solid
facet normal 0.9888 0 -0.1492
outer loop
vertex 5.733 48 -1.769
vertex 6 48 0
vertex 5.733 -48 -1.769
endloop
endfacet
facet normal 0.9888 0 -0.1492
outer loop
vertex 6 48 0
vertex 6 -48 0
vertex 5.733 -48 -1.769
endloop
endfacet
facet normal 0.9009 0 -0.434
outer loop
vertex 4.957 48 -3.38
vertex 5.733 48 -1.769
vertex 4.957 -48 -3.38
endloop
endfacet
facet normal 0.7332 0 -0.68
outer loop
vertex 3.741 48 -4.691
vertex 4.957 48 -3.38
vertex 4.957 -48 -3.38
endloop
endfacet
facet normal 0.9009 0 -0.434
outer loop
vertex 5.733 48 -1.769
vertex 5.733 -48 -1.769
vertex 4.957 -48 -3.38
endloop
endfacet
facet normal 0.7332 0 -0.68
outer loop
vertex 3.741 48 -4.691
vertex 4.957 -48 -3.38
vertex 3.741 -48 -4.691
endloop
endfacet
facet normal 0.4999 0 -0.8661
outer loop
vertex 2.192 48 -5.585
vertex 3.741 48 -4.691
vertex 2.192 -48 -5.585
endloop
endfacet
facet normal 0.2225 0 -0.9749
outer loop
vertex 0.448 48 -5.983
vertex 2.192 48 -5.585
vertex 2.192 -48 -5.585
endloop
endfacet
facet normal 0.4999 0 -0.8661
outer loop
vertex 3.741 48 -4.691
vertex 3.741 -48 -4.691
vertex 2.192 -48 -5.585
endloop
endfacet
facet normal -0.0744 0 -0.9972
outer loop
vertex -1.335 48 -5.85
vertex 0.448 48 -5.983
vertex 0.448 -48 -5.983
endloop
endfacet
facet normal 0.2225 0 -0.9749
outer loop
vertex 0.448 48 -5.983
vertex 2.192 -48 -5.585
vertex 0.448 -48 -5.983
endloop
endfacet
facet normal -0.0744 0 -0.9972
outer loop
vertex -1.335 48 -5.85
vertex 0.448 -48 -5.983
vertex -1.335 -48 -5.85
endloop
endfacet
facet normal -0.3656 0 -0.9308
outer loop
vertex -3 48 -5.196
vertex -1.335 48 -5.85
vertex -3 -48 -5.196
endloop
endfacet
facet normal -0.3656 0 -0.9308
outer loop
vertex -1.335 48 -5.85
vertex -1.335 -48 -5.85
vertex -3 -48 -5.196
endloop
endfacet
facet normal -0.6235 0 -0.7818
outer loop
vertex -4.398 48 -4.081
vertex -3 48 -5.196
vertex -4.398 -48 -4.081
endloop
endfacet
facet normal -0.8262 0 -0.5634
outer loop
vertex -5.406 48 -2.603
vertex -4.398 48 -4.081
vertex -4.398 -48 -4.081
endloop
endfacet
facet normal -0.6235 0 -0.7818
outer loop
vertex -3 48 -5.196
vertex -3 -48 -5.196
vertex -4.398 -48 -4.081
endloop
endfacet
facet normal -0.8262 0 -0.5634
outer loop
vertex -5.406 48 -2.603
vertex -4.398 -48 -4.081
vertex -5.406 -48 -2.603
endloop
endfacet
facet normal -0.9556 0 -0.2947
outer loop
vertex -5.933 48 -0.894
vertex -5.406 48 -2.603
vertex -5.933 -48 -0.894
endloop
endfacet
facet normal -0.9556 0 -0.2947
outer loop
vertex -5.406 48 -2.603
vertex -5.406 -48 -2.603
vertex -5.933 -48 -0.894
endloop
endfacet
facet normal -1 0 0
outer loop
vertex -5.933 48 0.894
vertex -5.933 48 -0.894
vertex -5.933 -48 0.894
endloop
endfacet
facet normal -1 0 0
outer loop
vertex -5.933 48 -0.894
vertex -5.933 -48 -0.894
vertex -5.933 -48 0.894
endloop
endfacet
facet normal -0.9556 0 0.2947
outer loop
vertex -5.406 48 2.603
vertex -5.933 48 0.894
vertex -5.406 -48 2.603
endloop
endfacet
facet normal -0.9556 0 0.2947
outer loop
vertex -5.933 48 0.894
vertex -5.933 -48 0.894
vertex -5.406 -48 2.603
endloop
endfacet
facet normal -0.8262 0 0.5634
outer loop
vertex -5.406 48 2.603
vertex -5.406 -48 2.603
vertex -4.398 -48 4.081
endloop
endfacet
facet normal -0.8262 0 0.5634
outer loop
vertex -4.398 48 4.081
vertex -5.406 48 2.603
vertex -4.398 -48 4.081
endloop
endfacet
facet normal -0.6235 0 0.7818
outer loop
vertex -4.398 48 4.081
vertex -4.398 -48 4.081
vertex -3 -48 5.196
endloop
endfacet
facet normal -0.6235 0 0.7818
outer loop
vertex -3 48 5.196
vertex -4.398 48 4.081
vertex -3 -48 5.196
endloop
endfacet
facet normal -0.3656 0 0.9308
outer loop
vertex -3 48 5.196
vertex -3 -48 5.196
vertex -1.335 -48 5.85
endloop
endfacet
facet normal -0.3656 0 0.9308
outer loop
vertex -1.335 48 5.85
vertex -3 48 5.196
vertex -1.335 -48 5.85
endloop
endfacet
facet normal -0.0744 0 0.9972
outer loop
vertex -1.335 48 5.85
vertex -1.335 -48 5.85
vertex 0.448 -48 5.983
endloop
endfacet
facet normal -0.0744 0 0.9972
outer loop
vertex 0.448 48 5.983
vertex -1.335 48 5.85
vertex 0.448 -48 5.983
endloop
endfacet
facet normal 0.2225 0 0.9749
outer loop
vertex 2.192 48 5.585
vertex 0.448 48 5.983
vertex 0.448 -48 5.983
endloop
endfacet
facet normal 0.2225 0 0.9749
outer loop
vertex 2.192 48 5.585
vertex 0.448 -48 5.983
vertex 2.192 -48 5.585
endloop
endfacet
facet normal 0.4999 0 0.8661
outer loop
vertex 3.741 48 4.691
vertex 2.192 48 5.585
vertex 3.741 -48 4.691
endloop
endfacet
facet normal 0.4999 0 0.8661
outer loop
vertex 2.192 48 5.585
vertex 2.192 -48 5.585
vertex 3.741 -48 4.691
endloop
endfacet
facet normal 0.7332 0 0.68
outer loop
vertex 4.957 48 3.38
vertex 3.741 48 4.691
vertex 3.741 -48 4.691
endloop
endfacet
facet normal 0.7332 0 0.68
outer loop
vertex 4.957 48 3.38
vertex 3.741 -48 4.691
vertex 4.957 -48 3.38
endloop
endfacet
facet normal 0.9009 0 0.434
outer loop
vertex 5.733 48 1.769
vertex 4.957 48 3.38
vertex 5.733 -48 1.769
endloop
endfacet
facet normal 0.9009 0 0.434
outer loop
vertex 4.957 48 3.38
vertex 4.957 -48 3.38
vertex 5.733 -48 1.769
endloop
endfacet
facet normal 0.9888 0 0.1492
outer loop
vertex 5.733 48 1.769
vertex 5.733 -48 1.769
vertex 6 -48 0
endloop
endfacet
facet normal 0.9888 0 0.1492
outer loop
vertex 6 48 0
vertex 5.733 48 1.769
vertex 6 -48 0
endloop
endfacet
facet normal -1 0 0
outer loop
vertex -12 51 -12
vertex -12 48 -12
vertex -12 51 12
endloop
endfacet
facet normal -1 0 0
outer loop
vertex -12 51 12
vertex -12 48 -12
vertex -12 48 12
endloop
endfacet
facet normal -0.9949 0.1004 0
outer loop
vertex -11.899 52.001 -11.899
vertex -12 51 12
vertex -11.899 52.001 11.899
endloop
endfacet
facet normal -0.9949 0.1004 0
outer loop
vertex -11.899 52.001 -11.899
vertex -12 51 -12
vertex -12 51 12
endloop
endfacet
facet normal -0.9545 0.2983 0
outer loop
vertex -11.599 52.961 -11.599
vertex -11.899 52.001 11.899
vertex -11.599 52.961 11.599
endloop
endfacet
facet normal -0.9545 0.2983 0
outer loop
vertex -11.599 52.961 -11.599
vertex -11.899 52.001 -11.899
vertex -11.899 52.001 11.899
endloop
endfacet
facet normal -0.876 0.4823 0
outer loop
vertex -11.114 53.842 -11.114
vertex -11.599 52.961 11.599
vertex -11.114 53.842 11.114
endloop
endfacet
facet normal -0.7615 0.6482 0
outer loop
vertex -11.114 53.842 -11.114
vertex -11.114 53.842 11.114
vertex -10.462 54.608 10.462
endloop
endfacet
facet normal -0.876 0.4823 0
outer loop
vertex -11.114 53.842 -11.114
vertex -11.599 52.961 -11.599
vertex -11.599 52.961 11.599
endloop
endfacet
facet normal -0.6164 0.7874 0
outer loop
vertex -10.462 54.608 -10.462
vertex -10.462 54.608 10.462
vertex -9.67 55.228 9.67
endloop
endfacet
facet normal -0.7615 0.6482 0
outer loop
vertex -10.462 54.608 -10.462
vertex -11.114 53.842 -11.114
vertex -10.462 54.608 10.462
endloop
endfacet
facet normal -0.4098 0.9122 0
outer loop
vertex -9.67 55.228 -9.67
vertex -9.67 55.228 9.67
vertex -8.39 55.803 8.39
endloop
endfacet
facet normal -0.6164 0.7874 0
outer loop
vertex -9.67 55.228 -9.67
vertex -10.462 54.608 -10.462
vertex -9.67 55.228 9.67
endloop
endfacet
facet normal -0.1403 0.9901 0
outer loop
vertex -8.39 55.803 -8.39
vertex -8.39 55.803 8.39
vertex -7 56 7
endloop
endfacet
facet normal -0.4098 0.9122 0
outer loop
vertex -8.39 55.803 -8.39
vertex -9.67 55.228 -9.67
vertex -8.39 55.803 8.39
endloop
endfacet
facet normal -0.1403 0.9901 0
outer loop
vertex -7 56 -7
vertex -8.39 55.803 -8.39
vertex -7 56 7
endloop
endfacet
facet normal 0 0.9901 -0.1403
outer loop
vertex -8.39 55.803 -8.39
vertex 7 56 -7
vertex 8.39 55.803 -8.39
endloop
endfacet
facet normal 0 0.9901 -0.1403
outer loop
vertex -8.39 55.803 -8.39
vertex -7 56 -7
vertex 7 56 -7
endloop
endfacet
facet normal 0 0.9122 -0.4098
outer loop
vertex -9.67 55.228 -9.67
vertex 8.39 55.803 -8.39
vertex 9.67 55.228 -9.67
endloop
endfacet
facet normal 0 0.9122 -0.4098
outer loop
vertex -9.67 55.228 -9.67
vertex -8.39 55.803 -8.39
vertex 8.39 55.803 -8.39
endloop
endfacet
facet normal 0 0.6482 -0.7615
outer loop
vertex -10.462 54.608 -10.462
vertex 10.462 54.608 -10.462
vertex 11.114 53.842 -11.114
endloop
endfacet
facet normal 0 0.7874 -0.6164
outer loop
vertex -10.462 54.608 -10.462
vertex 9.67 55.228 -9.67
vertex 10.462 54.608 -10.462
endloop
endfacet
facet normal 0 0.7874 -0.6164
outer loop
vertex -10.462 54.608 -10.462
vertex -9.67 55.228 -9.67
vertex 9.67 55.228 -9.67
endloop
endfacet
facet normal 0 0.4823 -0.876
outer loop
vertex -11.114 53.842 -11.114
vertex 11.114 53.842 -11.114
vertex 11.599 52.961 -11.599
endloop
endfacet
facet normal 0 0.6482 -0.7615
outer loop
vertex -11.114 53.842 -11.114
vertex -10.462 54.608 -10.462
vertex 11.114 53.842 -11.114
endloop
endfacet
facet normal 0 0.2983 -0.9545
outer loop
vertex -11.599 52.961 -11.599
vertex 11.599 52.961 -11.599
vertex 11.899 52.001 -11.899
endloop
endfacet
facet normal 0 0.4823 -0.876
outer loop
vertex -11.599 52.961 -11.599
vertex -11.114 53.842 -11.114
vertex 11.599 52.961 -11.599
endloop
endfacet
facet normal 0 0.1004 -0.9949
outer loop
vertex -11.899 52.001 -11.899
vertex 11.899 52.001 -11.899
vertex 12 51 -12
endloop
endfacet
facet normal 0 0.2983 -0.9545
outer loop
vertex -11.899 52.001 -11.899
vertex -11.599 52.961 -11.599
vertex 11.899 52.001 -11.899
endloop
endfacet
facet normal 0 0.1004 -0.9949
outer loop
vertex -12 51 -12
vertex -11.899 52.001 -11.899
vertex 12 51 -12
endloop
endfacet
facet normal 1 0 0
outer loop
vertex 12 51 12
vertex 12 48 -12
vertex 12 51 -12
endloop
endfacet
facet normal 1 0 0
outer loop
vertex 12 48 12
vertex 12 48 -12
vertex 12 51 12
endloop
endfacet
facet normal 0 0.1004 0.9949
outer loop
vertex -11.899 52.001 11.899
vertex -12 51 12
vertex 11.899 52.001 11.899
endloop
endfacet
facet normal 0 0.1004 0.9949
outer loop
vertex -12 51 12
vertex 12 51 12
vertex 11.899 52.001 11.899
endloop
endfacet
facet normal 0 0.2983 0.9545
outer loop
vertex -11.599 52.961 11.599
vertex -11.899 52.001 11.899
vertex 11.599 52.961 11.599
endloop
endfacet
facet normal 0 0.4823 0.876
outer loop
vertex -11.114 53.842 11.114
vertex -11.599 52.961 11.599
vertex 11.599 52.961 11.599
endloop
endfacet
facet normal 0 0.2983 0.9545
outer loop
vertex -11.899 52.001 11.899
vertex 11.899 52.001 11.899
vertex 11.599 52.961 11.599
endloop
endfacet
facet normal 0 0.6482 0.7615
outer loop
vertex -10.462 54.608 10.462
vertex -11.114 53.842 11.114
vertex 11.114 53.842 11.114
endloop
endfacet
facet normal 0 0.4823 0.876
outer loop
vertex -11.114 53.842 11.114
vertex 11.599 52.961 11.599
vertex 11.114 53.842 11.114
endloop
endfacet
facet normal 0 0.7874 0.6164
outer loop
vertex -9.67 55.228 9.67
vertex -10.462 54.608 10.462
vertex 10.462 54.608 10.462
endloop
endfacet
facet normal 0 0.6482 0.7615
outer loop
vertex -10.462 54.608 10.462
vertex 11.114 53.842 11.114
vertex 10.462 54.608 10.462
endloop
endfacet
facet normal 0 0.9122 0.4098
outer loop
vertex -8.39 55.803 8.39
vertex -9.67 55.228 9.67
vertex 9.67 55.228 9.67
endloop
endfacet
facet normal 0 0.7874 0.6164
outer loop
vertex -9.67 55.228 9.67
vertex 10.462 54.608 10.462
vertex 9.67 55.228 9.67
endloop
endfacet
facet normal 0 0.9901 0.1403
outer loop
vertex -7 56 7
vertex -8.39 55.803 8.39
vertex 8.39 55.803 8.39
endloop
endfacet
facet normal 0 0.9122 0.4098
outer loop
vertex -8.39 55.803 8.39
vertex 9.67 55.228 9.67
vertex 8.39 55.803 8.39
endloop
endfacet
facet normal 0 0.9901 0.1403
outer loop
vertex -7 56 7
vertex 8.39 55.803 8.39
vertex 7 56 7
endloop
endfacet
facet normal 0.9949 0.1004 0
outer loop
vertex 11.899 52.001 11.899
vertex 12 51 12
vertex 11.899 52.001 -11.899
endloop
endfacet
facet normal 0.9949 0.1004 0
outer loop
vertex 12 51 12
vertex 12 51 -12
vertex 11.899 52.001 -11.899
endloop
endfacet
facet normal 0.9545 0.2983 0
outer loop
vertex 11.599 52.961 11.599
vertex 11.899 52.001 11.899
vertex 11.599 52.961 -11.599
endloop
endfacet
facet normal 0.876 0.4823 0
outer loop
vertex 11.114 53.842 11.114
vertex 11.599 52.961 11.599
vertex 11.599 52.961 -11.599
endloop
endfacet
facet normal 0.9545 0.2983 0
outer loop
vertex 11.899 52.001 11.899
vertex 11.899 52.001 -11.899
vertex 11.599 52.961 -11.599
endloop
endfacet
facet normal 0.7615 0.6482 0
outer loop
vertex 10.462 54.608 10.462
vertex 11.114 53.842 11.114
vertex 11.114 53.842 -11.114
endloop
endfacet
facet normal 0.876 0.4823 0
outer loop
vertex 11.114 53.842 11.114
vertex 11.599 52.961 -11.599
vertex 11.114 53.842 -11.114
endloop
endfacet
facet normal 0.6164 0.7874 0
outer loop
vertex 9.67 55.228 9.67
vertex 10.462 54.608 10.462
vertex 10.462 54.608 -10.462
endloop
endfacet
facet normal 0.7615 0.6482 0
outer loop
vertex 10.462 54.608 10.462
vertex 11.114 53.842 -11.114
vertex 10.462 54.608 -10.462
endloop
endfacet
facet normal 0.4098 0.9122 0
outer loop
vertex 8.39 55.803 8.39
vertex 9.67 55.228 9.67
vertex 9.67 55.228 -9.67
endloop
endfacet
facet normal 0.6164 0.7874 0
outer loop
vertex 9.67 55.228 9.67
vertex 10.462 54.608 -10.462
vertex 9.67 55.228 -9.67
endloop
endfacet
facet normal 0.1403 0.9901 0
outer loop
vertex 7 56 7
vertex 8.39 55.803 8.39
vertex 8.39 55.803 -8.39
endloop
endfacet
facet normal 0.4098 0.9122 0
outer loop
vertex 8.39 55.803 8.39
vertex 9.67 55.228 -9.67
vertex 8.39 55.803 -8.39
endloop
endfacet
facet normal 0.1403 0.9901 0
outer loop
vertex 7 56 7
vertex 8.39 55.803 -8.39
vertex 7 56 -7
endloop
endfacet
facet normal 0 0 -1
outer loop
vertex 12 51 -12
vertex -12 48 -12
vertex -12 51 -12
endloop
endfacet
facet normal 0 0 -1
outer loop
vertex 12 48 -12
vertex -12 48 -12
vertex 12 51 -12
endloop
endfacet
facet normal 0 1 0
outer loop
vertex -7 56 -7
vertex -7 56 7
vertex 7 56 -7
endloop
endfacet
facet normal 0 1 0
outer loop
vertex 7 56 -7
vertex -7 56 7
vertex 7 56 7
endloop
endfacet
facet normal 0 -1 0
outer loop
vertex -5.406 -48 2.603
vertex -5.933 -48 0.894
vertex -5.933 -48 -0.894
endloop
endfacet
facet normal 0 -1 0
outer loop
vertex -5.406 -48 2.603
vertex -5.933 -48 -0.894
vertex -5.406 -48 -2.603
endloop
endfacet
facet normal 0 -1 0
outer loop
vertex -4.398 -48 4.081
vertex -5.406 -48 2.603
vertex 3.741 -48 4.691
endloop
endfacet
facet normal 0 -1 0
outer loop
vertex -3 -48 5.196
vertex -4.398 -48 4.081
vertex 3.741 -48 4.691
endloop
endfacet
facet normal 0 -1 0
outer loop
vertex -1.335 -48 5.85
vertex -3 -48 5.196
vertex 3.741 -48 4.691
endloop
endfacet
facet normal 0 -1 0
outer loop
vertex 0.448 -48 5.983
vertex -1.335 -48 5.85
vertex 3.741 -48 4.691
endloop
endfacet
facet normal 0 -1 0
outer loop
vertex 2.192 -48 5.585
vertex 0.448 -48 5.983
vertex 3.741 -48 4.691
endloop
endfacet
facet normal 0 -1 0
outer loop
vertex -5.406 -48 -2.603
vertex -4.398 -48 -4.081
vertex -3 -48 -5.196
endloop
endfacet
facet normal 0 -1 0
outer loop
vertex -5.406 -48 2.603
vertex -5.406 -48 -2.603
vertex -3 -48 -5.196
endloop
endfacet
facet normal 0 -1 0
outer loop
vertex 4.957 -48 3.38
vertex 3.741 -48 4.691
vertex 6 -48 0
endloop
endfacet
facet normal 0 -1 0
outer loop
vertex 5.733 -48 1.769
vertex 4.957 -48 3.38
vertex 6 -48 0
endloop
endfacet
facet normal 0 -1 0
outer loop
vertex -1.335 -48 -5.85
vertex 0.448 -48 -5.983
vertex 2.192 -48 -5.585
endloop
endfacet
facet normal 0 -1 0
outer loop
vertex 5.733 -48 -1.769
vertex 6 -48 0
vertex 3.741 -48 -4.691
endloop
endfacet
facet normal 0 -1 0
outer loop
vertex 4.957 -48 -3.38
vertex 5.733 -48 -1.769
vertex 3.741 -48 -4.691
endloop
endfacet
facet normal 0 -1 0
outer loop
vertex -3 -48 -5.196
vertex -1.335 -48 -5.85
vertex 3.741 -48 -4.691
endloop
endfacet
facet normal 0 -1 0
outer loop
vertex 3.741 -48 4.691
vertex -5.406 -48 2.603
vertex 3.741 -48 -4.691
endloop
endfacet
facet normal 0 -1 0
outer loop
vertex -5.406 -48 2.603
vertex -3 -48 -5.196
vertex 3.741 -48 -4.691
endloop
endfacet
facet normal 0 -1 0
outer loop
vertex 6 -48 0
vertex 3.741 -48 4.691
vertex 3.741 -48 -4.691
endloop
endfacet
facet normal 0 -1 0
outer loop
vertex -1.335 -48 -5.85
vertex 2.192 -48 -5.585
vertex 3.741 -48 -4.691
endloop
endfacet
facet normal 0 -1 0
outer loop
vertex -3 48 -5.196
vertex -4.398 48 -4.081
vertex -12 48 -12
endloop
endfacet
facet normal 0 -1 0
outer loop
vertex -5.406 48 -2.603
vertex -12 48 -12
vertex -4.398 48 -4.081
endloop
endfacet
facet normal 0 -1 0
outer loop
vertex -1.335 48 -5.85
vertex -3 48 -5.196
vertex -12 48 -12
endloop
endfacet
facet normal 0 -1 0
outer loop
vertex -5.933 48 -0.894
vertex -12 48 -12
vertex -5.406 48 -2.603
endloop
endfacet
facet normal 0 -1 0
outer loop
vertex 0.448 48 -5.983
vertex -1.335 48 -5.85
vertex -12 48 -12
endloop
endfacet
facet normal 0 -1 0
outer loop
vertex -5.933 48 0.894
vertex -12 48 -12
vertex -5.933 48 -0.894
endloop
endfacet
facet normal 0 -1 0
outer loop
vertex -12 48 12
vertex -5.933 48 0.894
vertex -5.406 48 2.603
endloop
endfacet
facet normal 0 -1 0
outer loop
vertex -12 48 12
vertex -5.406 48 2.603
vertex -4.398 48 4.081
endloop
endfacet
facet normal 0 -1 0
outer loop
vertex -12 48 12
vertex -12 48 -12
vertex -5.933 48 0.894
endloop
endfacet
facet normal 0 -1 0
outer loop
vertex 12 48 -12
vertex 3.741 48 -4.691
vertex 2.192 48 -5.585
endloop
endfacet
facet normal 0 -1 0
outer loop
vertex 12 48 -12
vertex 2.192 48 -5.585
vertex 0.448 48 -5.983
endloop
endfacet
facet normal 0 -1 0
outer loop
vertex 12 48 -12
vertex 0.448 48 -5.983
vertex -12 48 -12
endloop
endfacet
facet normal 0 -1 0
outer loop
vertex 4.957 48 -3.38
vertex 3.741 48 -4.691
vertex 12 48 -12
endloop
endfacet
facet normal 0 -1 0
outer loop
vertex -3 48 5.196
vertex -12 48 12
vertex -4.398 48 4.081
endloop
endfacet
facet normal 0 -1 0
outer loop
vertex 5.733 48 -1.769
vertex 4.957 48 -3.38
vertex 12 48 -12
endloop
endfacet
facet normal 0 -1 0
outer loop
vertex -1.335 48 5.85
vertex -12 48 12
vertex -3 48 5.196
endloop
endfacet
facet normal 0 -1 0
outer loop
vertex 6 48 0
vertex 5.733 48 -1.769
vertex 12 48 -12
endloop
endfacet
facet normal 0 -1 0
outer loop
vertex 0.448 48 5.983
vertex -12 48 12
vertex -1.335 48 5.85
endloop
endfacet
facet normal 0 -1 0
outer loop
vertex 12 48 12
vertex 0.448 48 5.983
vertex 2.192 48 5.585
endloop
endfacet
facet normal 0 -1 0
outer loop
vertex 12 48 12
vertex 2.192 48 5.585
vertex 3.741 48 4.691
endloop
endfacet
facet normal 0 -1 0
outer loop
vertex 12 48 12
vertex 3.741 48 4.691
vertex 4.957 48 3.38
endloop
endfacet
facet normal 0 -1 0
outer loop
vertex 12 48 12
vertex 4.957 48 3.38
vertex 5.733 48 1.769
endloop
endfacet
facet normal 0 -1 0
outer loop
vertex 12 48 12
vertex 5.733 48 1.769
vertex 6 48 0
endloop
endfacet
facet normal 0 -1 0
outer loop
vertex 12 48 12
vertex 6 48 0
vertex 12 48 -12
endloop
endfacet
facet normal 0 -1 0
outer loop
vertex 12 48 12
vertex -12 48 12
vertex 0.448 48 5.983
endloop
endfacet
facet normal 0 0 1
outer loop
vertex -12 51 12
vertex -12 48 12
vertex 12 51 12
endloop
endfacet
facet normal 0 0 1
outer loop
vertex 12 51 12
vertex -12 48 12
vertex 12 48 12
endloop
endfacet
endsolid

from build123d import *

# Parameters (mm, degrees)
SKETCH3_W           = 24
SKETCH3_H           = 24
BOSS_EXTRUDE1_DEPTH = 8
FILLET1_R           = 5


with BuildPart() as part:
    # Sketch1 → Revolve1 (revolve)
    with BuildSketch(Plane.XY, mode=Mode.PRIVATE) as revolve1_sk:
        Polygon((0, 56), (-12, 56), (-12, 48), (-6, 48), (-6, -48), (0, -48), align=None)
    revolve(revolve1_sk.sketch.rotate(Axis((0, -48, 0), (0, 1, 0)), 180), axis=Axis((0, -48, 0), (0, 1, 0)))

    # Sketch3 → Boss-Extrude1 (add)
    with BuildSketch(Plane.XZ.offset(-48)):
        Rectangle(SKETCH3_W, SKETCH3_H)
    extrude(amount=-BOSS_EXTRUDE1_DEPTH)

    # Fillet1
    fillet1_edges = [part.edges().sort_by_distance(p)[0] for p in [
        (-12, 56, 0),
        (0, 56, 12),
        (12, 56, 0),
        (0, 56, -12),
    ]]
    fillet(fillet1_edges, radius=FILLET1_R)


solid = part.part
